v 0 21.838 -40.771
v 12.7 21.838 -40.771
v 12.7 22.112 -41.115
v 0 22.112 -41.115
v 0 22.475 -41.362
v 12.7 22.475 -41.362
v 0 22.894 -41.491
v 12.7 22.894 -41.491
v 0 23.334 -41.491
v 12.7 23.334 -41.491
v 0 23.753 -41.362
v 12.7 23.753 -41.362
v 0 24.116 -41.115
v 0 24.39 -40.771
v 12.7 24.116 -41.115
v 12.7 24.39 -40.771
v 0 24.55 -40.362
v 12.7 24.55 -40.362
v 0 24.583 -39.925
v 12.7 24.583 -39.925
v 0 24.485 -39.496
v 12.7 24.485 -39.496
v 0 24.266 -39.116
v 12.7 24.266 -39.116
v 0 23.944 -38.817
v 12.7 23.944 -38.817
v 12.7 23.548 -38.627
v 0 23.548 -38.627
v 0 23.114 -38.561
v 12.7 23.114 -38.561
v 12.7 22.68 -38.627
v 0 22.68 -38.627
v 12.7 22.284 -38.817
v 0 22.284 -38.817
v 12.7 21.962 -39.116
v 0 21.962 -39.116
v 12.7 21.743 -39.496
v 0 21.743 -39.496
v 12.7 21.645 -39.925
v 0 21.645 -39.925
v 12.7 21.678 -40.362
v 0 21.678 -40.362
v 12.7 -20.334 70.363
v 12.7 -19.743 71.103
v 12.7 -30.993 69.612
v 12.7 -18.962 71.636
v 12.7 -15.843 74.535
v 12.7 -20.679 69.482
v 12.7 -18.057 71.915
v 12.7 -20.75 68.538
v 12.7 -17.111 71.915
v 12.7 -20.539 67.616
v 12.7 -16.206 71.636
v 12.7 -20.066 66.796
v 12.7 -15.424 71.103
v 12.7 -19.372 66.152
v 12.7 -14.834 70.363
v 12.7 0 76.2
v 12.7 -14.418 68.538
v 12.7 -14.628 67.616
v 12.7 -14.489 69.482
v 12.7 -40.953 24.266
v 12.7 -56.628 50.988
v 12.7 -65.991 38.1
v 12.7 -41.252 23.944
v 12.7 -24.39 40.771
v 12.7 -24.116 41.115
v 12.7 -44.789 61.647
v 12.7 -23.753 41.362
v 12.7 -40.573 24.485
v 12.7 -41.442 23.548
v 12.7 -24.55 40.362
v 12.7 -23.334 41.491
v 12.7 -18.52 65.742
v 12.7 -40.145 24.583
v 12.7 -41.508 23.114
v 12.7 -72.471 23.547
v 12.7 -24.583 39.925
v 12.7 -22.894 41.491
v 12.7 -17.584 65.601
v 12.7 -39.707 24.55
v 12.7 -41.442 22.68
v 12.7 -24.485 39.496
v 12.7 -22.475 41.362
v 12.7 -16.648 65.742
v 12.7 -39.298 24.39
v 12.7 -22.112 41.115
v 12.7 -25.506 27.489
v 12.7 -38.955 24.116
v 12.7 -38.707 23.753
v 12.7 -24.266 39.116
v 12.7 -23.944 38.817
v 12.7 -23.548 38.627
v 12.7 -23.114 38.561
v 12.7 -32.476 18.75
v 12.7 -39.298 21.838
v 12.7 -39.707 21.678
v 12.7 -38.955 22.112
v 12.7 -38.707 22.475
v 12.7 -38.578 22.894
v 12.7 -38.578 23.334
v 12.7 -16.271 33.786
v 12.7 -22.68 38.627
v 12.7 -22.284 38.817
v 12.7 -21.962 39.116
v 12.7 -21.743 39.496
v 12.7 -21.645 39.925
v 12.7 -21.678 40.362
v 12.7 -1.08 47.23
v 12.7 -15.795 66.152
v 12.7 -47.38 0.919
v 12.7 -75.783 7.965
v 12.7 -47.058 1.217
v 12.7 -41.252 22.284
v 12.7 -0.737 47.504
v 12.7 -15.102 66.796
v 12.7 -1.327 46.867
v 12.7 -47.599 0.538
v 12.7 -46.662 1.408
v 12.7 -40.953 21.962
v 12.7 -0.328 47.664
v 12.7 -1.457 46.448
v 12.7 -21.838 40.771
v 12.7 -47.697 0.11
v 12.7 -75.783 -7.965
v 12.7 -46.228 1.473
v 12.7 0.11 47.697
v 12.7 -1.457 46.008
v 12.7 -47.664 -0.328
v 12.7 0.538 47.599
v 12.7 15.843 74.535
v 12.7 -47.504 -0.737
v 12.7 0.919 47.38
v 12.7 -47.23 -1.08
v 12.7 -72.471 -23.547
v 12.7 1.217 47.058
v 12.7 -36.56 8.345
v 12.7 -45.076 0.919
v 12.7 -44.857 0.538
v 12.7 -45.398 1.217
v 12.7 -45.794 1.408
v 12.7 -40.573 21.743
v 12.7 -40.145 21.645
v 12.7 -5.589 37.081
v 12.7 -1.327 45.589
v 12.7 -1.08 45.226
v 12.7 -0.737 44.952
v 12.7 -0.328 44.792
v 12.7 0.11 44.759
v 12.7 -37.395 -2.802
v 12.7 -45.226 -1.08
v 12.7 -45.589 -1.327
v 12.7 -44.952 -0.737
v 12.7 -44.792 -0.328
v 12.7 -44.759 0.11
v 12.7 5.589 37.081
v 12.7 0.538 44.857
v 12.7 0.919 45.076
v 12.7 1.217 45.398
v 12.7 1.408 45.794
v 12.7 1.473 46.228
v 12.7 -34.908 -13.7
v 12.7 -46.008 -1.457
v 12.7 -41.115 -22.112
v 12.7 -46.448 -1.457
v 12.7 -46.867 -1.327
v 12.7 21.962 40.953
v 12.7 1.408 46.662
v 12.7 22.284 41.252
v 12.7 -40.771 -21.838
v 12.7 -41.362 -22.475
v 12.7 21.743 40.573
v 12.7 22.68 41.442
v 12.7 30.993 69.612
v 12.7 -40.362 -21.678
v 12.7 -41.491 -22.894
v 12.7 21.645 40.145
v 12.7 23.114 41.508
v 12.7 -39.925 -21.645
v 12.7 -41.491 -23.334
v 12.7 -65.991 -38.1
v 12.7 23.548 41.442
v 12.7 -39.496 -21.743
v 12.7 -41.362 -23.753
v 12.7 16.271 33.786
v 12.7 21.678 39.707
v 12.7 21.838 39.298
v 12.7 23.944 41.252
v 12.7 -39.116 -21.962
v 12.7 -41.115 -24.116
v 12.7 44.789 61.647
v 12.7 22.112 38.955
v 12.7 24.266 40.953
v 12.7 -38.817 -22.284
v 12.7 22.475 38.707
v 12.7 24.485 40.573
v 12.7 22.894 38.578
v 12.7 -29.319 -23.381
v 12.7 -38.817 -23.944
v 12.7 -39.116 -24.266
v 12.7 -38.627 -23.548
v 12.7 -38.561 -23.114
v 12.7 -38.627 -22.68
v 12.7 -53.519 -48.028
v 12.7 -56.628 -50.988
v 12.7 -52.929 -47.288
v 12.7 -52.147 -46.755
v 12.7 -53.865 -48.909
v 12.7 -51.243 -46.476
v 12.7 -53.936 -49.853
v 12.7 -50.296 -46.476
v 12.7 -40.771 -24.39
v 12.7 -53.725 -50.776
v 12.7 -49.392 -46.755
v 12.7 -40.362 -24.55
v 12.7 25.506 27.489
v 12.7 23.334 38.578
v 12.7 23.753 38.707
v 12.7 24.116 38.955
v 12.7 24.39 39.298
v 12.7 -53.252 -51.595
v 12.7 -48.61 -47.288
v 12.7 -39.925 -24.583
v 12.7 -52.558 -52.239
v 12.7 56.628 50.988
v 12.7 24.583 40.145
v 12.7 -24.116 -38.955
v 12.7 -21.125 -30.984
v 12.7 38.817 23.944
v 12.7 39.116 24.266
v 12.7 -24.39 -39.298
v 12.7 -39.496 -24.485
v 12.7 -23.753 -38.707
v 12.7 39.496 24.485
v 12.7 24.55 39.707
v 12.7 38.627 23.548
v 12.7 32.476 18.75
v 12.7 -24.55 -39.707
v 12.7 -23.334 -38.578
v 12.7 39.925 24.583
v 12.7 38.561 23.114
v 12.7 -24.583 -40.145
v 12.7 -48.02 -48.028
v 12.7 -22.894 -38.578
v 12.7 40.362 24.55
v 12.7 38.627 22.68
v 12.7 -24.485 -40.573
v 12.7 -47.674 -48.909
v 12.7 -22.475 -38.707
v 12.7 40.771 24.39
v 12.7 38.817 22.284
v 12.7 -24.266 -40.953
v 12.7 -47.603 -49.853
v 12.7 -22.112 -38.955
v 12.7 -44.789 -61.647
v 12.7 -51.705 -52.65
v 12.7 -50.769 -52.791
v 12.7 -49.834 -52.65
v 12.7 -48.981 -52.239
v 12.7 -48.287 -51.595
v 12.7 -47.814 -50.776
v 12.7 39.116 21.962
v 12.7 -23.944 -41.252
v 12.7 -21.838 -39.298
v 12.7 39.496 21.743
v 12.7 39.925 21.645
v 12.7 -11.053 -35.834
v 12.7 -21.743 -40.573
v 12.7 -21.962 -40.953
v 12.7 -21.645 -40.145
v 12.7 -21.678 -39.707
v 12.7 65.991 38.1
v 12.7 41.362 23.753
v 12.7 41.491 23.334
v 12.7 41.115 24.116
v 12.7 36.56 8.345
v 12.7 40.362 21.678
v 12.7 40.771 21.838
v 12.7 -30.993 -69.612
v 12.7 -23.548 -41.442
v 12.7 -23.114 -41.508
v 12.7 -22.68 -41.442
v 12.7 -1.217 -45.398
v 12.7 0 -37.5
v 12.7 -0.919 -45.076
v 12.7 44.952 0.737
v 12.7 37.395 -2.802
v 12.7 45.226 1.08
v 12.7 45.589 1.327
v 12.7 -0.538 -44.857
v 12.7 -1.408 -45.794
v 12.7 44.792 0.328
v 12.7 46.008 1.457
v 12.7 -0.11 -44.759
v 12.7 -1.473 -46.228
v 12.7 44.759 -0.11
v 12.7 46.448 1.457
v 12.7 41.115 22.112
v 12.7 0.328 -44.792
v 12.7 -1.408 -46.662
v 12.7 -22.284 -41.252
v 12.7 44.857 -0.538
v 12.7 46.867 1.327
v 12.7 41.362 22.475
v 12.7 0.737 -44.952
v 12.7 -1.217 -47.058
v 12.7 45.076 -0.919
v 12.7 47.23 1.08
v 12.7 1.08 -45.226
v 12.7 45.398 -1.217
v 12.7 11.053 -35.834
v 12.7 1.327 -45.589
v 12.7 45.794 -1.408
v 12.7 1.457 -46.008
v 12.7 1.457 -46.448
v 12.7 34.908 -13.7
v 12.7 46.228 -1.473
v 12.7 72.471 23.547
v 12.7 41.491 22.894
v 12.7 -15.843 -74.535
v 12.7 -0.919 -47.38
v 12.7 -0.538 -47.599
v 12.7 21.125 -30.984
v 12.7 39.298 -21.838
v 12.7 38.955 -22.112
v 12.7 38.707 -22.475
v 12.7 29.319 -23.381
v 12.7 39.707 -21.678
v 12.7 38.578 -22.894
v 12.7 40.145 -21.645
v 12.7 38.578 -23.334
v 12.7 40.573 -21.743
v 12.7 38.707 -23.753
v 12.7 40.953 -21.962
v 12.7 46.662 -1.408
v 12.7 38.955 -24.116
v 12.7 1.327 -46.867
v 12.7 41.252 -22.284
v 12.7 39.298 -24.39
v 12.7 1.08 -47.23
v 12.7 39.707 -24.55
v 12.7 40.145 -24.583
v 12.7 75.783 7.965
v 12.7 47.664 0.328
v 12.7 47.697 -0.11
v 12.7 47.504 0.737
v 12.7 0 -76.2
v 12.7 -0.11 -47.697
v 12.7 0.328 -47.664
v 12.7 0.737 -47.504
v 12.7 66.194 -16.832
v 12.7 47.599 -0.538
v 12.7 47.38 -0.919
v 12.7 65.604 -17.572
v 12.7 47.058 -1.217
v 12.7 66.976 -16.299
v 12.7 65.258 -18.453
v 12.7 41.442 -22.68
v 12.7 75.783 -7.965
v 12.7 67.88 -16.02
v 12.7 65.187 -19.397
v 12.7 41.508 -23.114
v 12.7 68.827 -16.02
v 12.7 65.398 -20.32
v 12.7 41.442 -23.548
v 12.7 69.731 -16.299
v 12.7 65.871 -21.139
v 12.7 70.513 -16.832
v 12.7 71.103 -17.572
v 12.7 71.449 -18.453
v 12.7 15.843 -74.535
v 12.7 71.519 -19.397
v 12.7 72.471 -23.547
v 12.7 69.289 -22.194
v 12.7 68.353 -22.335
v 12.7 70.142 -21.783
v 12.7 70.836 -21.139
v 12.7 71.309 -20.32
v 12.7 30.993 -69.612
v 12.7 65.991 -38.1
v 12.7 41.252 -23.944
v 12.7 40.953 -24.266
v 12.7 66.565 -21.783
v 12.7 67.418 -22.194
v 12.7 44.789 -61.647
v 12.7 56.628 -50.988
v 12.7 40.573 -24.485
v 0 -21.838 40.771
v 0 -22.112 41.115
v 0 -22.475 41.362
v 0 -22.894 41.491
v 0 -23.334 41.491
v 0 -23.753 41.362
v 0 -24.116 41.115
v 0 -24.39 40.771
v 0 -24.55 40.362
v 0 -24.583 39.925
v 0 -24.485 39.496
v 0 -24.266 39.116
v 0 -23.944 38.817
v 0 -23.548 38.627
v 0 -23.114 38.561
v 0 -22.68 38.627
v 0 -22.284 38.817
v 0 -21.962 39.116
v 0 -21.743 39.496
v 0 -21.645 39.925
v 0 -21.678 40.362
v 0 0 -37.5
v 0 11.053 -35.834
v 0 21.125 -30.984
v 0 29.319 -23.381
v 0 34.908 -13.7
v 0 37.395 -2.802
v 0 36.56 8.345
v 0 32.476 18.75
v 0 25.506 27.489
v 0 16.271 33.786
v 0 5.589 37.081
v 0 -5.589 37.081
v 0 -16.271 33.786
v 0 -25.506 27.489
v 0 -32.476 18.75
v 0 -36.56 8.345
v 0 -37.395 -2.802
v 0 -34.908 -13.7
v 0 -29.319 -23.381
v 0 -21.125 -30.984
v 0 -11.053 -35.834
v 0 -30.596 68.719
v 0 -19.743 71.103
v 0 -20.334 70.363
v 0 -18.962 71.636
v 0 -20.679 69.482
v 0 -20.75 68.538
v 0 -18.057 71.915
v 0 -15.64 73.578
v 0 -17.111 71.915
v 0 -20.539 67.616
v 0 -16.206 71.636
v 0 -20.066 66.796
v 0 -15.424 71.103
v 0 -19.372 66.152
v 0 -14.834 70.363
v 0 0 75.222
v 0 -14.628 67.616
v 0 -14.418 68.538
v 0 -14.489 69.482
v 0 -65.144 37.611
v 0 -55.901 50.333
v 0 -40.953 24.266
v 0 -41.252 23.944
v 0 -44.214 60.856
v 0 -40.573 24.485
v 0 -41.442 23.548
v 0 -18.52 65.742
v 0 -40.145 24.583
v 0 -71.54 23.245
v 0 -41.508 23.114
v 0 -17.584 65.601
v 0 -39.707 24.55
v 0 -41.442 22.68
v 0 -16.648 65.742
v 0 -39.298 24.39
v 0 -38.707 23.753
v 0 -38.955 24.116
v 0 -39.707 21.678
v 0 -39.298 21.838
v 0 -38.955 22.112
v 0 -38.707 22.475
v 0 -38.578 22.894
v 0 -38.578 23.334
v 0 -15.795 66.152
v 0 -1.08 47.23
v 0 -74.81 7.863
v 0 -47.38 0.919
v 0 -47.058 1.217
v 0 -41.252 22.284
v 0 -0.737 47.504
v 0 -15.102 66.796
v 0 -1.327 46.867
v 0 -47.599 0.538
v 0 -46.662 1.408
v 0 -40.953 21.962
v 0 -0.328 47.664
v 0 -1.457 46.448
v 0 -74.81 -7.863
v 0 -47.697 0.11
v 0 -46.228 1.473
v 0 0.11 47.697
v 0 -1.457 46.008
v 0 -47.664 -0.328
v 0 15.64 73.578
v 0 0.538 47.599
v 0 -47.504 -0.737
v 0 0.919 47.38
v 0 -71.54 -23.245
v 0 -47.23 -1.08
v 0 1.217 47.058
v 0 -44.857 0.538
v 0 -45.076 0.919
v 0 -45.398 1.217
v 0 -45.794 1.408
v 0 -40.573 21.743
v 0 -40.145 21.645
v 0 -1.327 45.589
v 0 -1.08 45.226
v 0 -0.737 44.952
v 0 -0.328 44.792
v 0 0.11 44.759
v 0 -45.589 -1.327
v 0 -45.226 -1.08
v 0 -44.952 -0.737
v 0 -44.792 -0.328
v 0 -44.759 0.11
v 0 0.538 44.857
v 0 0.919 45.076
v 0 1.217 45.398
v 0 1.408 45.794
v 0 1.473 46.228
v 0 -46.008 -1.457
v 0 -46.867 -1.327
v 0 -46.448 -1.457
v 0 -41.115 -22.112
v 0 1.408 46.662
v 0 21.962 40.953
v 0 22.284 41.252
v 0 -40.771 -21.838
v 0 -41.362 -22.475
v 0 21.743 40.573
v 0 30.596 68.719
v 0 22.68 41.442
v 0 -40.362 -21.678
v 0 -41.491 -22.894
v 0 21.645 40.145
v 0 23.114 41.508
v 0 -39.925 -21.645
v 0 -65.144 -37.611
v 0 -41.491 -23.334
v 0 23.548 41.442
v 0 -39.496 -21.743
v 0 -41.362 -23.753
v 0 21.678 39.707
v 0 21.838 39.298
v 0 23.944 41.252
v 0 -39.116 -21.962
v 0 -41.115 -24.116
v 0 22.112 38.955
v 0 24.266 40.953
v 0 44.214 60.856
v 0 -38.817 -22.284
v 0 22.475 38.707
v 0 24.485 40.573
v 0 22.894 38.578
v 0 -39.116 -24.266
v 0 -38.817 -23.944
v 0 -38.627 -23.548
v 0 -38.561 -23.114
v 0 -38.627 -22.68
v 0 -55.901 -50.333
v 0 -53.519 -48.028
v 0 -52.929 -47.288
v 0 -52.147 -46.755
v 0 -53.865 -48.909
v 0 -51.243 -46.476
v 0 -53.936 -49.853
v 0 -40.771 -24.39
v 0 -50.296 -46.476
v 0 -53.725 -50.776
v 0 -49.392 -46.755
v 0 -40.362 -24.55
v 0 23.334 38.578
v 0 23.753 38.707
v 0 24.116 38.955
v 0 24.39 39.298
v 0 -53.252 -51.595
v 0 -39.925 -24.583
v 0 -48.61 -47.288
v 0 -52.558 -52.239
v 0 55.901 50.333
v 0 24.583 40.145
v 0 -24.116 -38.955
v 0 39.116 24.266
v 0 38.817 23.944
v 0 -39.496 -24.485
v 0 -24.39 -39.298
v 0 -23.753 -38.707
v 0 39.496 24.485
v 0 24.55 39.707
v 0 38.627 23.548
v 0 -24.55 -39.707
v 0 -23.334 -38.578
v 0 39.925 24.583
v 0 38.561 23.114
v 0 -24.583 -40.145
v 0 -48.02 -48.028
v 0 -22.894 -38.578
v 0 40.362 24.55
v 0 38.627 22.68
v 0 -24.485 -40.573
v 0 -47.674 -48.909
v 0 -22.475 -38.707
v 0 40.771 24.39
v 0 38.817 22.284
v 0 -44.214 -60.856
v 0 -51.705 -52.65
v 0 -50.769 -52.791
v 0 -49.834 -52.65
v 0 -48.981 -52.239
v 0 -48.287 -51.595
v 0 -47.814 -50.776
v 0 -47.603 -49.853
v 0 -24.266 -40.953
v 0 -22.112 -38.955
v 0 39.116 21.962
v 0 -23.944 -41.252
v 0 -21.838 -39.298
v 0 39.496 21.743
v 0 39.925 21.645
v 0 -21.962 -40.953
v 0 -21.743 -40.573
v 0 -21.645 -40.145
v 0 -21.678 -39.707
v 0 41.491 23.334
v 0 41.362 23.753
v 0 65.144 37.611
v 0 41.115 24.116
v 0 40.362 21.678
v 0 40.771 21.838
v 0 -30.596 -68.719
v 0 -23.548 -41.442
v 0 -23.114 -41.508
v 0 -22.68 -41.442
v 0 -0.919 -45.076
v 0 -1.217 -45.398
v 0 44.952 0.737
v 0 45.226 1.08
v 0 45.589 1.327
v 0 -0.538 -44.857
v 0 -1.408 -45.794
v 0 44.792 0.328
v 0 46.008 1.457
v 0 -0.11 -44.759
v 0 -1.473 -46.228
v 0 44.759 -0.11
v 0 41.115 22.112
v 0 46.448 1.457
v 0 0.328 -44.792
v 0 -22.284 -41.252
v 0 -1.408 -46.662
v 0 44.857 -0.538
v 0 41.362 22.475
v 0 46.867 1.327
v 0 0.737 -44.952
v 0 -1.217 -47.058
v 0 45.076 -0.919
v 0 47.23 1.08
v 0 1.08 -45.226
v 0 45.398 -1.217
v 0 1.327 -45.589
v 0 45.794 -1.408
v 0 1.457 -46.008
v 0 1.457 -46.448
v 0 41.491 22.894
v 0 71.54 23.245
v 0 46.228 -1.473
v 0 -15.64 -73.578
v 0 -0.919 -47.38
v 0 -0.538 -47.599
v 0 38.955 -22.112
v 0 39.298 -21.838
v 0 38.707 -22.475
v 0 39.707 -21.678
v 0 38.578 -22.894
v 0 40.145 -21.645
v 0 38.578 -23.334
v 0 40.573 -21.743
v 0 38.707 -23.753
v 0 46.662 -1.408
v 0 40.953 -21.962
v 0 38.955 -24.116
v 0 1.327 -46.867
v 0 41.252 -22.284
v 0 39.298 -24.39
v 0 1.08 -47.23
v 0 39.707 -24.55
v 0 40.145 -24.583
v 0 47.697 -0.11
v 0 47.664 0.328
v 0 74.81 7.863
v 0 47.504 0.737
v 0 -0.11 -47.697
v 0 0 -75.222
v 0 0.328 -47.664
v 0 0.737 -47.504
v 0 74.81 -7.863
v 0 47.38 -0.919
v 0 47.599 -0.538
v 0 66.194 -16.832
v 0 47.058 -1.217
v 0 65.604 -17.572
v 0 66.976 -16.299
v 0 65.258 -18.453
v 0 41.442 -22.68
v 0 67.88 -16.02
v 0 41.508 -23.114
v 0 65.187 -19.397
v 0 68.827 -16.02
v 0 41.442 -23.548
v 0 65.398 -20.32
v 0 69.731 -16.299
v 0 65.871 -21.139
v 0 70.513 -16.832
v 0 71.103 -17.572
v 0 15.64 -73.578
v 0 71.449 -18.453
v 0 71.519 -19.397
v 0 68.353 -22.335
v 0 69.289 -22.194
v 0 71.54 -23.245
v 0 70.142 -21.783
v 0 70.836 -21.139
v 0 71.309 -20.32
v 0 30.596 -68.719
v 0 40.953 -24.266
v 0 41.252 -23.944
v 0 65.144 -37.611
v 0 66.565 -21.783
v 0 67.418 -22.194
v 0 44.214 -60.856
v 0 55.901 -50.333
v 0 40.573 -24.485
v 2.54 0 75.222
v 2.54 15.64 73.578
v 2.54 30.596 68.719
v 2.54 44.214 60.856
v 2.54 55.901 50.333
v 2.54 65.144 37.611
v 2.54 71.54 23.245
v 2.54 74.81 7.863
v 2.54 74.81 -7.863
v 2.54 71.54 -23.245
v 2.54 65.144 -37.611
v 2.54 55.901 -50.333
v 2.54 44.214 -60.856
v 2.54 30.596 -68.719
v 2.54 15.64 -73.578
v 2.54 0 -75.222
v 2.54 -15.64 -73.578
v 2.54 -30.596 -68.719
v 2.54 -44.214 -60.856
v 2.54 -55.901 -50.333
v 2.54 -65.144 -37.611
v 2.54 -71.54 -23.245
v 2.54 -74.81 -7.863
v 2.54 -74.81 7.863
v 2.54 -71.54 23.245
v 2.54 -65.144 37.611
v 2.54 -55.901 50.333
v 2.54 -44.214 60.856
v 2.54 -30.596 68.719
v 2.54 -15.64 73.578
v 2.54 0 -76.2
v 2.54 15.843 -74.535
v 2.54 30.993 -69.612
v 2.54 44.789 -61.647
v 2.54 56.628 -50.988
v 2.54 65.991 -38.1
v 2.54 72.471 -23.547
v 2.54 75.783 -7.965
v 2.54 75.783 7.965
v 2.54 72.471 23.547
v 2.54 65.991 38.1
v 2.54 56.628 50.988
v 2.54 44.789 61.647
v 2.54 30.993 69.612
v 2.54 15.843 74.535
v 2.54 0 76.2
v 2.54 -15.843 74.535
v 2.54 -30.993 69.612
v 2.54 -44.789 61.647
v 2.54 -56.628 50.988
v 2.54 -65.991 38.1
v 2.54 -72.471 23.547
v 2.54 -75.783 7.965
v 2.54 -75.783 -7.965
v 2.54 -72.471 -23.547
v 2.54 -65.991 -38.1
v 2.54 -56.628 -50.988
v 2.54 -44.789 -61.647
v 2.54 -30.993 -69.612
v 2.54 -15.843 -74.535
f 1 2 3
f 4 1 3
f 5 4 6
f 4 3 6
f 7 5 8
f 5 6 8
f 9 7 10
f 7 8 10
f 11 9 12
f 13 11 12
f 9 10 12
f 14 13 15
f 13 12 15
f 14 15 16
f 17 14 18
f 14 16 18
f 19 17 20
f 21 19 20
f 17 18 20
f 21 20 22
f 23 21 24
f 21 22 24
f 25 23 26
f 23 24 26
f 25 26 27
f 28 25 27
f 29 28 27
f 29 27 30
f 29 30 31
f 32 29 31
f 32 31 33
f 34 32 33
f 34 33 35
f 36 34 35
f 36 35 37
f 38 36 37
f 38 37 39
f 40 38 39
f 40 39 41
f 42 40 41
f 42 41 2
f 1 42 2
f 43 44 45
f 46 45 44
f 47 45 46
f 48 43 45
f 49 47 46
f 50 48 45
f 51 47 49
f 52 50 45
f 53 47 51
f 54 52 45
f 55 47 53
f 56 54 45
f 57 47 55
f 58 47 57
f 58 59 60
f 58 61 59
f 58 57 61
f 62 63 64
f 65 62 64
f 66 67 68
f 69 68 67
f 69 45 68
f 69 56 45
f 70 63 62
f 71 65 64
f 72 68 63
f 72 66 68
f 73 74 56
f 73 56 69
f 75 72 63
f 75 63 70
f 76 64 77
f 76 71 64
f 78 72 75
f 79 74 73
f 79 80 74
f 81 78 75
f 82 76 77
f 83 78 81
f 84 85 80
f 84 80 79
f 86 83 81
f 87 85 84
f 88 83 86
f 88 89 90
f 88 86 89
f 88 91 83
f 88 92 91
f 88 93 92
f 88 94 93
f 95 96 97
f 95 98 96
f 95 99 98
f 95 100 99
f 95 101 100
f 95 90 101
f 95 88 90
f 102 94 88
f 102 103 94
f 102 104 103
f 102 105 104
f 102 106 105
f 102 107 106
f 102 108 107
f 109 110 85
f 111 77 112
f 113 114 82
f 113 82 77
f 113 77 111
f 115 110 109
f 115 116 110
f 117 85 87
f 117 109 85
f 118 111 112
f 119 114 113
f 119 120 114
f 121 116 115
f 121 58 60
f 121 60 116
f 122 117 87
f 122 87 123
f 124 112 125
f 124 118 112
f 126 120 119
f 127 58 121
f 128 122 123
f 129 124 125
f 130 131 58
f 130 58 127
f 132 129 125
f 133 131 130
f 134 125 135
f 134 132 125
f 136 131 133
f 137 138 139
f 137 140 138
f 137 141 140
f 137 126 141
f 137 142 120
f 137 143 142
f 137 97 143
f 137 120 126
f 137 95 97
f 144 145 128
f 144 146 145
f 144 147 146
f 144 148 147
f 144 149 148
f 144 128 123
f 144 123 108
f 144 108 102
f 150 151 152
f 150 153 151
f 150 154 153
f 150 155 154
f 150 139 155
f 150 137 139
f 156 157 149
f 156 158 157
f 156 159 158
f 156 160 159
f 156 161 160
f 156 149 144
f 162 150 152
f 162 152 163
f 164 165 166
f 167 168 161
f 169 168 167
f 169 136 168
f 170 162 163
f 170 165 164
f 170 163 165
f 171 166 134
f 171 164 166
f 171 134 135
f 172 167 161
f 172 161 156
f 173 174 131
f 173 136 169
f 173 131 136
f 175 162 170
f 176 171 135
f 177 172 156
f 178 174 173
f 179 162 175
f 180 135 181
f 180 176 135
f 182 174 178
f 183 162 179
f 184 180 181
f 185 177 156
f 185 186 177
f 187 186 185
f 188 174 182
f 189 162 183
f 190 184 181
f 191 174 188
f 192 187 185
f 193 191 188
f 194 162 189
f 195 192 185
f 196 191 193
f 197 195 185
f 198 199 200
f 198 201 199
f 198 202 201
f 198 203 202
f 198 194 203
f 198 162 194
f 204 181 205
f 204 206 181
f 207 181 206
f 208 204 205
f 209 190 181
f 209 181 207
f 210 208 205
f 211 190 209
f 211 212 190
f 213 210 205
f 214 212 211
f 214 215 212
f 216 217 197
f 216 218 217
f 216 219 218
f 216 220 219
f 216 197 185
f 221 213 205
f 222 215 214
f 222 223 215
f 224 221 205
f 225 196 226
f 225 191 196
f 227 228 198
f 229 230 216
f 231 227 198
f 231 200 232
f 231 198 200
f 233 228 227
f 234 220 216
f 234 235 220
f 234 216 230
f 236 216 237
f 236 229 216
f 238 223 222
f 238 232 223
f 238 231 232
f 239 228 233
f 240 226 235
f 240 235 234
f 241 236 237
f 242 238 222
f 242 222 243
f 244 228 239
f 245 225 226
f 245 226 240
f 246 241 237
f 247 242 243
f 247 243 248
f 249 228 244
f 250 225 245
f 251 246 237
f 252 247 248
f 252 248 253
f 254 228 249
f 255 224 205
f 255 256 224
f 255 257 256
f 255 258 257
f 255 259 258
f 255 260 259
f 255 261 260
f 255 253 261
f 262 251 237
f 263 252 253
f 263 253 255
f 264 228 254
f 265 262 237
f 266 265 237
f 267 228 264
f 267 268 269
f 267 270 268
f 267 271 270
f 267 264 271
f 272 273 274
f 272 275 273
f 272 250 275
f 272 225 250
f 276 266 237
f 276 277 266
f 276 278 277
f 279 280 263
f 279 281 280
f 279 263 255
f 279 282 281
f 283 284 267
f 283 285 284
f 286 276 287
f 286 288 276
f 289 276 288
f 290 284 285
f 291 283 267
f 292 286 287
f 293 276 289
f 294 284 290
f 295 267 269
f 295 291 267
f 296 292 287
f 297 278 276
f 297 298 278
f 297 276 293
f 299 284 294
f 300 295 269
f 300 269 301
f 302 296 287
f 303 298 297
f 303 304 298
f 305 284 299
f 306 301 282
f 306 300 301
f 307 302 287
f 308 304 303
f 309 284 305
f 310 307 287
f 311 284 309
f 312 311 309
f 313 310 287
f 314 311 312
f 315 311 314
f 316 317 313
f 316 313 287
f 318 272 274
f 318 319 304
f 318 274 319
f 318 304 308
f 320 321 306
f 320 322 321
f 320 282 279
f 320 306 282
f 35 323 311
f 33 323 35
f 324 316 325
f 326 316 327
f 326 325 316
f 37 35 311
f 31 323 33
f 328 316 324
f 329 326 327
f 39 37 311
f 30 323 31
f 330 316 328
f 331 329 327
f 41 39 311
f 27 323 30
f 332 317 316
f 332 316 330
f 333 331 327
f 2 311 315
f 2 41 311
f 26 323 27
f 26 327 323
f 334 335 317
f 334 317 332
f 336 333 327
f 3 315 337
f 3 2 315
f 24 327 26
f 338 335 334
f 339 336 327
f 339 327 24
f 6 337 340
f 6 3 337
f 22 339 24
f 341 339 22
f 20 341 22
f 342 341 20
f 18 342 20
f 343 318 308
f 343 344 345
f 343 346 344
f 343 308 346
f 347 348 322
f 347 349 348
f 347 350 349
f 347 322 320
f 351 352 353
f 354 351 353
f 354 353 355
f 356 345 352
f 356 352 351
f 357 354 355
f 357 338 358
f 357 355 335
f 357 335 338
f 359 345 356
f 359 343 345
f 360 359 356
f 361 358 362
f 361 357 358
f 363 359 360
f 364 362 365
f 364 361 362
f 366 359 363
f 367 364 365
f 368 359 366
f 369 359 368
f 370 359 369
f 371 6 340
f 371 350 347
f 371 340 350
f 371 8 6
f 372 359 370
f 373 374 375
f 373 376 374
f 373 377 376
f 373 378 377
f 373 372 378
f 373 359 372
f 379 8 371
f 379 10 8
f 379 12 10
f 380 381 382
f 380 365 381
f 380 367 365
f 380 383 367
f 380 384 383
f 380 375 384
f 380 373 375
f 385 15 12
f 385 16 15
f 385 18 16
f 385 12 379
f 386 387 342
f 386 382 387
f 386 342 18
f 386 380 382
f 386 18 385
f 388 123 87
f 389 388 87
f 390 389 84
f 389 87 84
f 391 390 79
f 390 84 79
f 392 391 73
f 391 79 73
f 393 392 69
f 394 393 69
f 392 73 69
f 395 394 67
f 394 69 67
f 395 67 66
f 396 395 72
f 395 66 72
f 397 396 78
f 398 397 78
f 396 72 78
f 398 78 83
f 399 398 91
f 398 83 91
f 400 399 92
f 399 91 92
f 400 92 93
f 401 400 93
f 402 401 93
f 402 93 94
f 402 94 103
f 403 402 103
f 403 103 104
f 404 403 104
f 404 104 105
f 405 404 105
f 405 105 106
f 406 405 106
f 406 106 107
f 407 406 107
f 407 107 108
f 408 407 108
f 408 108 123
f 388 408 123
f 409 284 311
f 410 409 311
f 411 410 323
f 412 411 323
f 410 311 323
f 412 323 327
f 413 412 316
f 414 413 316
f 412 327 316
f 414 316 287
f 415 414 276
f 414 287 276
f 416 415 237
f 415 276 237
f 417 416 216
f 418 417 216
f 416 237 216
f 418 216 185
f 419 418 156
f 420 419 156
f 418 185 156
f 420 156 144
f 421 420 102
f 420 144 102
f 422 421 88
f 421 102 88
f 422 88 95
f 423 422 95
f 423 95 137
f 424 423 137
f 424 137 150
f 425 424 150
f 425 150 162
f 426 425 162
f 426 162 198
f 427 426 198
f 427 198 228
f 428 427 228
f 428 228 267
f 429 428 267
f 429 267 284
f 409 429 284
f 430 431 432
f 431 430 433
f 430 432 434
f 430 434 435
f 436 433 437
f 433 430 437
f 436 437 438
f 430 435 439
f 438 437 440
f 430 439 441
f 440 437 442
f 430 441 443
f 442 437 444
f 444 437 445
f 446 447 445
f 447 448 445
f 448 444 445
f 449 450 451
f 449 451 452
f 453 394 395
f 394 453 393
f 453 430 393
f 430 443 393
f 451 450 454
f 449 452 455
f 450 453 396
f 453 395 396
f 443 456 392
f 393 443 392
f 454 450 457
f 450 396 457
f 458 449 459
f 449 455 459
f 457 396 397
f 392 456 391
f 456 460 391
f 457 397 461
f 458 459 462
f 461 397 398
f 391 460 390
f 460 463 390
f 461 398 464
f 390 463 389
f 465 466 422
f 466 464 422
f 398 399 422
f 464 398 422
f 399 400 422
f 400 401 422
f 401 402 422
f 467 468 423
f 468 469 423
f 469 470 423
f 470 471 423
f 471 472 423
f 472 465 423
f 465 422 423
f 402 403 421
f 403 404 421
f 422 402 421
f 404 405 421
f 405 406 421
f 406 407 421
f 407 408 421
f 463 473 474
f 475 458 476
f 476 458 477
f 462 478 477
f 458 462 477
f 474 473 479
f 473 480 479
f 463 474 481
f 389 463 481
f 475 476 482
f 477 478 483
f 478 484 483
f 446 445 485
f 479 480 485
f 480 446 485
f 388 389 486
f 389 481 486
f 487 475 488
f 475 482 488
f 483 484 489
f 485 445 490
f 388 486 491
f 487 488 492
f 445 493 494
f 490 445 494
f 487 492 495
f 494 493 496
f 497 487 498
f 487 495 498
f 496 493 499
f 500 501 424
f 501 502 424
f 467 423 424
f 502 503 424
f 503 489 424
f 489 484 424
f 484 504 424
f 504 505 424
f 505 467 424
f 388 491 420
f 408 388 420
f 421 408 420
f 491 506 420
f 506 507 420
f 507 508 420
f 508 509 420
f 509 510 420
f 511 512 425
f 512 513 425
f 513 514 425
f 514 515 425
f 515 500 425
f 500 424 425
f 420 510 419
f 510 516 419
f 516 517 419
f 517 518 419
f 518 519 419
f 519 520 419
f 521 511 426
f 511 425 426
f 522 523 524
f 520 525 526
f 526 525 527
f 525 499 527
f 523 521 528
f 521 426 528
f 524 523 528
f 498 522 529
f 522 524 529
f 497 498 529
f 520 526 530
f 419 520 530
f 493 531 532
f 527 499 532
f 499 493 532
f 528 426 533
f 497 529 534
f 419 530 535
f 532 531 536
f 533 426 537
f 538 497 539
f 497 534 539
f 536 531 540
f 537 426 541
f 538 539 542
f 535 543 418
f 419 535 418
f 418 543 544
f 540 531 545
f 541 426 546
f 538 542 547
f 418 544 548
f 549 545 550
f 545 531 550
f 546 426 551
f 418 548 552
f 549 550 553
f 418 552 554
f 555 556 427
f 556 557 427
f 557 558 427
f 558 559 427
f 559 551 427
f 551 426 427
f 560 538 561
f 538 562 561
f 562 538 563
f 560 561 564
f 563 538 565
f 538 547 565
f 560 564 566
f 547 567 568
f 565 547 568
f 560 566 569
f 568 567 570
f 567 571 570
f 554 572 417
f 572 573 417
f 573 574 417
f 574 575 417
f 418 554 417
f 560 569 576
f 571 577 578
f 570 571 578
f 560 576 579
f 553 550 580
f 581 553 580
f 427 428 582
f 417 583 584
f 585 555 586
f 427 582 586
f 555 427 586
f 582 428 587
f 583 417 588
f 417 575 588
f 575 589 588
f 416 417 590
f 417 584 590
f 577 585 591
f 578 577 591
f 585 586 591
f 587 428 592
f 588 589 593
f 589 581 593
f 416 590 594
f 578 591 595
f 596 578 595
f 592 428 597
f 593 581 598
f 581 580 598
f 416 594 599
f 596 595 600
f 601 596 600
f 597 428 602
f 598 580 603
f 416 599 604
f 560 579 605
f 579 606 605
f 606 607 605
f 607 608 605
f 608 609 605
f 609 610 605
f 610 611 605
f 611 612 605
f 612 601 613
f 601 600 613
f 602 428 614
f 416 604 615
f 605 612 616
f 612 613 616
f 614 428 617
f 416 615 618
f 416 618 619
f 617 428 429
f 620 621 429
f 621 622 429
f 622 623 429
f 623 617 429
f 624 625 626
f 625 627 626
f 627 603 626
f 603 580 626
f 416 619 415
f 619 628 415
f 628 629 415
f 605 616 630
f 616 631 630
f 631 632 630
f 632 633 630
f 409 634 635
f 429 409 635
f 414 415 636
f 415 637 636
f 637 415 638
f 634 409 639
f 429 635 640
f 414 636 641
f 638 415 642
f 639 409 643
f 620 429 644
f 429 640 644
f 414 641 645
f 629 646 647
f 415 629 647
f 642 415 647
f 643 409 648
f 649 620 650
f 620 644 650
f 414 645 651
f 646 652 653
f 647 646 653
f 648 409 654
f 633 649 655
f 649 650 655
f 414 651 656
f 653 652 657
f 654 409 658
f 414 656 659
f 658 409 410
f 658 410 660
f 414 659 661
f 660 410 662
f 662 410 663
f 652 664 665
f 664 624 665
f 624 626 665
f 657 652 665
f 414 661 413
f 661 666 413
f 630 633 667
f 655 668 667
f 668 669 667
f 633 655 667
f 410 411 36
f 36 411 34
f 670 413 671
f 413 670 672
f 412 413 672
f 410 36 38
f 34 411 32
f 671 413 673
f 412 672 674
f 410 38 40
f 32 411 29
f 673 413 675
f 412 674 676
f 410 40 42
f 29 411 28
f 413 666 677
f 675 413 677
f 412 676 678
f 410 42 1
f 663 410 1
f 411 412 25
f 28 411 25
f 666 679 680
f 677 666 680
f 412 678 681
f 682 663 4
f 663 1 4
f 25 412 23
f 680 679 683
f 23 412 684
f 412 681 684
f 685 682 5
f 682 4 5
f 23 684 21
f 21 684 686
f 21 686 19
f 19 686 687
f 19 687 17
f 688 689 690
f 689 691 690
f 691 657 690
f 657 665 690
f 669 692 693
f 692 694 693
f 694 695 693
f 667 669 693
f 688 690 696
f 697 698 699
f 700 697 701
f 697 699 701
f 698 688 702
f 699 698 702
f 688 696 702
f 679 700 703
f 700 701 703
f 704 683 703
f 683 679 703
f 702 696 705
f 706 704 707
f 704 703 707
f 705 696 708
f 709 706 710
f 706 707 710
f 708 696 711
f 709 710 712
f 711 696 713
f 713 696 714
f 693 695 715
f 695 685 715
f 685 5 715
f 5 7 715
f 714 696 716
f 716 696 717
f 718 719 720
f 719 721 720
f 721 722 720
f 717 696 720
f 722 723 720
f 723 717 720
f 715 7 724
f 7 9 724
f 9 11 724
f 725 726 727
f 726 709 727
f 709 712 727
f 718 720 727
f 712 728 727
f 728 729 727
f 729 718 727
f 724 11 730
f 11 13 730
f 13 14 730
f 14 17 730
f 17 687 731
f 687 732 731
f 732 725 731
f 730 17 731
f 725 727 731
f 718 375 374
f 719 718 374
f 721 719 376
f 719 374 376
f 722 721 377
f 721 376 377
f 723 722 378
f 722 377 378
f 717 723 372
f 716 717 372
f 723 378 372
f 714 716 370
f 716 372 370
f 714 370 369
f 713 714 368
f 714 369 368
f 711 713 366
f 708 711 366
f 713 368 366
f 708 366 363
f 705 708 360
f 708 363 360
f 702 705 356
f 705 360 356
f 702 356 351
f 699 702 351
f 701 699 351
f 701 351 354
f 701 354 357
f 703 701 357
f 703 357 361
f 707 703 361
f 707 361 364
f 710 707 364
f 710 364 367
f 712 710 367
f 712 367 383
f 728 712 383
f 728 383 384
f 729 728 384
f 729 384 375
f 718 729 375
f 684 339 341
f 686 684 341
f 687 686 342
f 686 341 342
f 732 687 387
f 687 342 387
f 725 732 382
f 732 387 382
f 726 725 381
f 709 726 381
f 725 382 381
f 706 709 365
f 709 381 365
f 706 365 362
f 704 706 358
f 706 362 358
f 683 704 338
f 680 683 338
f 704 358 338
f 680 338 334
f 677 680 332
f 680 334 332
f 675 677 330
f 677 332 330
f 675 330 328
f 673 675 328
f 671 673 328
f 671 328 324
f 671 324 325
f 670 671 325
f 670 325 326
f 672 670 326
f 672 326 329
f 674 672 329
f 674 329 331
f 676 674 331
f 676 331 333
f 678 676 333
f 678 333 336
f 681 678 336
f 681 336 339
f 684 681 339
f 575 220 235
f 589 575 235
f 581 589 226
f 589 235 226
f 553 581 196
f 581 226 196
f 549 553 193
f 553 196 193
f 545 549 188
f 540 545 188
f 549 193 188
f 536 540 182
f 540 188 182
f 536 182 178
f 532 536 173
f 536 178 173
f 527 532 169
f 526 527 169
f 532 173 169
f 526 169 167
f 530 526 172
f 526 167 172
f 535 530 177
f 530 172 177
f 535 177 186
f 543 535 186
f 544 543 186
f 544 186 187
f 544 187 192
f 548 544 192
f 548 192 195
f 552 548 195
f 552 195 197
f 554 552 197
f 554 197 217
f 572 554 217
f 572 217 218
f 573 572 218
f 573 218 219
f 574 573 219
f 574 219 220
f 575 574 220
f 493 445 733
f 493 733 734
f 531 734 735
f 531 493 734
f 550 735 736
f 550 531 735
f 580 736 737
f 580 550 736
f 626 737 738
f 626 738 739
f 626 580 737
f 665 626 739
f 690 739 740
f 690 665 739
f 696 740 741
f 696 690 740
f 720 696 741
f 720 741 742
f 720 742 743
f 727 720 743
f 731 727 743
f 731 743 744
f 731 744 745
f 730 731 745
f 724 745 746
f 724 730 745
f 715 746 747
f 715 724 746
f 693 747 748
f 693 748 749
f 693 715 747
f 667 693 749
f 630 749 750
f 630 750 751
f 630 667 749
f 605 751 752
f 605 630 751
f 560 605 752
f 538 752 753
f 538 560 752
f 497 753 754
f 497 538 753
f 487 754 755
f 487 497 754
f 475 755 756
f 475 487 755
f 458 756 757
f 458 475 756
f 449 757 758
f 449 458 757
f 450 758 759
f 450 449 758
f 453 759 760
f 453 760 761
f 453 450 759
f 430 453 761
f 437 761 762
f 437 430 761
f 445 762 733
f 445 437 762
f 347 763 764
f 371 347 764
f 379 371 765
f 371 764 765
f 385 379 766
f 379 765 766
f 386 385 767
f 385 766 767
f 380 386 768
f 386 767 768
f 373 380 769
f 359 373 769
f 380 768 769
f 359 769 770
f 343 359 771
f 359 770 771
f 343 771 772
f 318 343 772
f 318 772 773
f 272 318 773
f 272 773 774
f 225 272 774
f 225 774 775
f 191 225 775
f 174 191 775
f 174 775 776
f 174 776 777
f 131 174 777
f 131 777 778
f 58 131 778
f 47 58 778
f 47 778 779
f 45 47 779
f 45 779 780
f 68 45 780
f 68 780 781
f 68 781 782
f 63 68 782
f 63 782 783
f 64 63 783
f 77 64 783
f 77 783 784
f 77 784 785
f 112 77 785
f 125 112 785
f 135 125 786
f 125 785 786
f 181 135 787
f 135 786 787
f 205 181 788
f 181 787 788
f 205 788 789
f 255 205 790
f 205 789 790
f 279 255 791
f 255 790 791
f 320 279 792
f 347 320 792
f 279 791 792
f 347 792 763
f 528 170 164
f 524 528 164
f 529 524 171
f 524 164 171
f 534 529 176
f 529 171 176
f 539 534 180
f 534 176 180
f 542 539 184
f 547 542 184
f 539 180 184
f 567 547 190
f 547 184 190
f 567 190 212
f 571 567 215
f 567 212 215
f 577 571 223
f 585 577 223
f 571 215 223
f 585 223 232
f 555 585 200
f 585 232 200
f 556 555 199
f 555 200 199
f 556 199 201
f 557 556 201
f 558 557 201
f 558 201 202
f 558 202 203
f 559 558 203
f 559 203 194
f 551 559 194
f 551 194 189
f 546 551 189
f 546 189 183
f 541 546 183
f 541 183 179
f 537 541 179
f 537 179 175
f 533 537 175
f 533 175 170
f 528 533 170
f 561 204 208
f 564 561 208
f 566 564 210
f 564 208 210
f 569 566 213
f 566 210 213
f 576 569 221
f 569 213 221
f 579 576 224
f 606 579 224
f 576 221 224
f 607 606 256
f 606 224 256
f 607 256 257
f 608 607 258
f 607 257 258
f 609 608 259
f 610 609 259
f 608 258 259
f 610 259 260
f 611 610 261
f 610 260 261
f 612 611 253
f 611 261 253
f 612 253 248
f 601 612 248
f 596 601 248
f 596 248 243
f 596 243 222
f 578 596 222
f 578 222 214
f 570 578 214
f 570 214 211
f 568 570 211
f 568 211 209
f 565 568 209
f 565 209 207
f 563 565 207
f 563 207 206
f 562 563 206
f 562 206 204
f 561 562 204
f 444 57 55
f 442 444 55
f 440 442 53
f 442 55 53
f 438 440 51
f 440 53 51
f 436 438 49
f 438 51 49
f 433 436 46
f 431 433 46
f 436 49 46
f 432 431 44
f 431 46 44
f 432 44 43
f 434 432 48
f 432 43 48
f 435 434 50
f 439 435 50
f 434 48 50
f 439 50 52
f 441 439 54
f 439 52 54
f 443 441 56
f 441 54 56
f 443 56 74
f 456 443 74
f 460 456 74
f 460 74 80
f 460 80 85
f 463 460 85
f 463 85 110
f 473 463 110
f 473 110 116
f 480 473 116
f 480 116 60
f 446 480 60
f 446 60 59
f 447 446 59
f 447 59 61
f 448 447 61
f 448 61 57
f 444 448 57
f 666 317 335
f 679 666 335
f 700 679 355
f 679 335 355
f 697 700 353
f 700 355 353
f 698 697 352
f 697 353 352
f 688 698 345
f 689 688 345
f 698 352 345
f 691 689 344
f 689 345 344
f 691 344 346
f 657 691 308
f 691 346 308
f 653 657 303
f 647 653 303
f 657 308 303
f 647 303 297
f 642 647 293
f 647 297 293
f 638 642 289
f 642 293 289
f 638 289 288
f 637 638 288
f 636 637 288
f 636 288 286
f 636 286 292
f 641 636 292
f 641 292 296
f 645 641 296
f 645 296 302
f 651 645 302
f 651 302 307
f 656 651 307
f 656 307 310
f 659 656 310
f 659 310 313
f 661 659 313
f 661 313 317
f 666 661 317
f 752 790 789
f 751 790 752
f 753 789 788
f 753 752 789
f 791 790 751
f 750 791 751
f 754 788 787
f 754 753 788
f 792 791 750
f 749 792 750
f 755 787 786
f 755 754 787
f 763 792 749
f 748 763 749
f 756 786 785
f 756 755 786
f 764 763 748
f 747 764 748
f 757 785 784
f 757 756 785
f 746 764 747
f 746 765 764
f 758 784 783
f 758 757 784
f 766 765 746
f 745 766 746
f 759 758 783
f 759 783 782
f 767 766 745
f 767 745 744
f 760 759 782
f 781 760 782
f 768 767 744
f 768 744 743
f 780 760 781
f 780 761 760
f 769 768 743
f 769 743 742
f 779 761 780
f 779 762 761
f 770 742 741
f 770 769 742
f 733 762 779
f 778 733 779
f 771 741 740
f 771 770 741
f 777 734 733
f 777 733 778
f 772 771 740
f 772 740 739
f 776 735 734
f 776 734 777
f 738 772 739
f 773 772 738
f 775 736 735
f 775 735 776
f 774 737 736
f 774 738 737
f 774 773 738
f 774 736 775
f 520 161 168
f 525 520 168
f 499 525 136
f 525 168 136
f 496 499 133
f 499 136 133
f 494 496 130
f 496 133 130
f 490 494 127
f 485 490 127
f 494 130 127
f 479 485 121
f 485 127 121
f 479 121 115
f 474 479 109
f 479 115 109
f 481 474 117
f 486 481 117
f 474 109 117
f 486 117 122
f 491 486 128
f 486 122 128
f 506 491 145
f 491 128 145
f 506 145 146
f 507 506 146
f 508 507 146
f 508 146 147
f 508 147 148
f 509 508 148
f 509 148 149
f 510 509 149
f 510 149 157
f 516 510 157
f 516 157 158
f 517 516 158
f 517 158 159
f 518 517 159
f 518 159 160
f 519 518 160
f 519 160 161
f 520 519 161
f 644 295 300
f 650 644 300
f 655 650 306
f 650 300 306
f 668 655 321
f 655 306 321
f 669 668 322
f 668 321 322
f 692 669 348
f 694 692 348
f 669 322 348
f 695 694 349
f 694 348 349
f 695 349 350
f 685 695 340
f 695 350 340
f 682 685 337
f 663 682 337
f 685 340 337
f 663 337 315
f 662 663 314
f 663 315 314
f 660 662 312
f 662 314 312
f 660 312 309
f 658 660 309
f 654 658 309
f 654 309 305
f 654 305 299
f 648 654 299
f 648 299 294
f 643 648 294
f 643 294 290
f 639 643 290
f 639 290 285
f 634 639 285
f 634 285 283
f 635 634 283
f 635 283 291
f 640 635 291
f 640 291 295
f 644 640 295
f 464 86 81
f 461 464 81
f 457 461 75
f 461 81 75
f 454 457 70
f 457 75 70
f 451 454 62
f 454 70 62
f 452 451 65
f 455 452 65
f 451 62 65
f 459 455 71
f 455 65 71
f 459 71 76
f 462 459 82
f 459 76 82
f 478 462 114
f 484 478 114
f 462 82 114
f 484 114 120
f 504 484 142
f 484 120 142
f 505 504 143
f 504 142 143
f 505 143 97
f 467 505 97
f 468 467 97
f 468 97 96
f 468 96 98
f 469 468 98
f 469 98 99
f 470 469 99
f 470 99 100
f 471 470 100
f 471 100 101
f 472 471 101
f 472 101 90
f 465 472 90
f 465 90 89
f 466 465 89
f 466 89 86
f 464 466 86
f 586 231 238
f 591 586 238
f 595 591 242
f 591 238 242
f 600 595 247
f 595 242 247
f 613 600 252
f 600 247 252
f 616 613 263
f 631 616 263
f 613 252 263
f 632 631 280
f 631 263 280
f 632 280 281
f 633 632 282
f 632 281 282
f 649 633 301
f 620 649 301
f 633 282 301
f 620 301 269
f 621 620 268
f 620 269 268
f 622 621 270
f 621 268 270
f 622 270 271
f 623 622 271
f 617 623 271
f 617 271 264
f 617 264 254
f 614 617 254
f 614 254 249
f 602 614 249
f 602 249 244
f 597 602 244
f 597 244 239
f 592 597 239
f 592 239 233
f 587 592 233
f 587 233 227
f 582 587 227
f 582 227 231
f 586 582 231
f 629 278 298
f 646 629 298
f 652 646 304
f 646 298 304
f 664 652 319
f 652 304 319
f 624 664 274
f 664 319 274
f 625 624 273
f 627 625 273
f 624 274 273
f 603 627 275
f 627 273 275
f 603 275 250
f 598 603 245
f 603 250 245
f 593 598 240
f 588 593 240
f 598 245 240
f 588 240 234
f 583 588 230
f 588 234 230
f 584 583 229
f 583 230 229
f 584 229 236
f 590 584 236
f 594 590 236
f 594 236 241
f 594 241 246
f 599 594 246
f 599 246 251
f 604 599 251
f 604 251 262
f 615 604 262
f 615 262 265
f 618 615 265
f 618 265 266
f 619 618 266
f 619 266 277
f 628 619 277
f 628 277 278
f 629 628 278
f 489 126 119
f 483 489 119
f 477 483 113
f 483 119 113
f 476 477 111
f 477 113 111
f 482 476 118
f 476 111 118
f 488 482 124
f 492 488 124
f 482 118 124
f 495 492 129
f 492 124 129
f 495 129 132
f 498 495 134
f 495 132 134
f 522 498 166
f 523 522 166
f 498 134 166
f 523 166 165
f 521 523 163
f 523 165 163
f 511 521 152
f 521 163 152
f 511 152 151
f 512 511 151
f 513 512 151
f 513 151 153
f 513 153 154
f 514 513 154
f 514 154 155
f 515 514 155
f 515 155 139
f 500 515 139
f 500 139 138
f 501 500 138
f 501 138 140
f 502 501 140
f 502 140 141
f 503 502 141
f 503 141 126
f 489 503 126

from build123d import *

# Parameters (mm, degrees)
SKETCH1_R           = 76.2
BOSS_EXTRUDE1_DEPTH = 12.7
SKETCH2_R           = 37.5
CUT_EXTRUDE1_DEPTH  = 109.508847566
SKETCH8_R           = 1.4732
CUT_EXTRUDE3_DEPTH  = 109.508847566
CIRPATTERN6_COUNT   = 12
SKETCH11_R          = 3.175
CUT_EXTRUDE4_DEPTH  = 109.508847566
CIRPATTERN7_COUNT   = 3
SKETCH13_OUTSIDE_W  = 197.58
SKETCH13_OUTSIDE_H  = 197.58
SKETCH13_OUTSIDE_R  = 75.2221
CUT_EXTRUDE5_DEPTH  = 2.54


with BuildPart() as part:
    # Sketch1 → Boss-Extrude1 (new body)
    with BuildSketch(Plane(origin=(0, 0, 0), x_dir=(0, 0, -1), z_dir=(1, 0, 0))):
        Circle(SKETCH1_R)
    extrude(amount=BOSS_EXTRUDE1_DEPTH)

    # Sketch2 → Cut-Extrude1 (cut, through all)
    with BuildSketch(Plane(origin=(12.7, 0, 0), x_dir=(0, 0, -1), z_dir=(1, 0, 0))):
        Circle(SKETCH2_R)
    extrude(amount=-CUT_EXTRUDE1_DEPTH, mode=Mode.SUBTRACT)

    # Sketch8 → Cut-Extrude3 (cut, through all)
    with BuildSketch(Plane(origin=(12.7, 0, 0), x_dir=(0, 0, -1), z_dir=(1, 0, 0))):
        with Locations((0, 46.228)):
            Circle(SKETCH8_R)
    cut_extrude3 = extrude(amount=-CUT_EXTRUDE3_DEPTH, mode=Mode.SUBTRACT)

    # CirPattern6: Cut-Extrude3 ×12 about axis
    cirpattern6_axis = Axis((0, 0, 0), (1, 0, 0))
    for i in range(1, CIRPATTERN6_COUNT):
        add(cut_extrude3.rotate(cirpattern6_axis, i * 360 / CIRPATTERN6_COUNT), mode=Mode.SUBTRACT)

    # Sketch11 → Cut-Extrude4 (cut, through all)
    with BuildSketch(Plane(origin=(12.7, 0, 0), x_dir=(0, 0, -1), z_dir=(1, 0, 0))):
        with Locations((19.159653756, 68.353359348)):
            Circle(SKETCH11_R)
    cut_extrude4 = extrude(amount=-CUT_EXTRUDE4_DEPTH, mode=Mode.SUBTRACT)

    # CirPattern7: Cut-Extrude4 ×3 about axis
    cirpattern7_axis = Axis((0, 0, 0), (1, 0, 0))
    for i in range(1, CIRPATTERN7_COUNT):
        add(cut_extrude4.rotate(cirpattern7_axis, i * 360 / CIRPATTERN7_COUNT), mode=Mode.SUBTRACT)

    # Sketch13 outside → Cut-Extrude5 (cut)
    with BuildSketch(Plane.ZY):
        Rectangle(SKETCH13_OUTSIDE_W, SKETCH13_OUTSIDE_H)
        Circle(SKETCH13_OUTSIDE_R, mode=Mode.SUBTRACT)
    extrude(amount=-CUT_EXTRUDE5_DEPTH, mode=Mode.SUBTRACT)


solid = part.part
